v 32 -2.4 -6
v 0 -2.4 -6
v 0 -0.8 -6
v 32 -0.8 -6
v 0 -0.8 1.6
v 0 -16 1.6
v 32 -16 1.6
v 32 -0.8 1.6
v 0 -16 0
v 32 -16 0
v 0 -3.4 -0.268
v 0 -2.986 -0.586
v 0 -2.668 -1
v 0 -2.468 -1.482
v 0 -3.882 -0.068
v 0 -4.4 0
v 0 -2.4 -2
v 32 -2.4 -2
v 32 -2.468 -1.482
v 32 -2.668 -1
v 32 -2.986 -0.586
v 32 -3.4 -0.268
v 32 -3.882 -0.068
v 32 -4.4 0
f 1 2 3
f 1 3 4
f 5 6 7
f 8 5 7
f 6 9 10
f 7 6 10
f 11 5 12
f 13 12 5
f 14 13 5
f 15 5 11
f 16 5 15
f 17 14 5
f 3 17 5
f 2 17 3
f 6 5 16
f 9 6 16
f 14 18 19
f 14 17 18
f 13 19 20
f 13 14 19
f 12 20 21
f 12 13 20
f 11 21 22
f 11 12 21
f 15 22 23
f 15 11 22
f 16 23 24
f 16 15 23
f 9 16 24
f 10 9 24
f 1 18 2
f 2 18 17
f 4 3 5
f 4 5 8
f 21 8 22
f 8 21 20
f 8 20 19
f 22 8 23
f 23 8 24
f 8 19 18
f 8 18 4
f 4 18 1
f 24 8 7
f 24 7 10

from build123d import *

# Parameters (mm, degrees)
SKETCH4_W           = 32
SKETCH4_H           = 16
BOSS_EXTRUDE3_DEPTH = 1.6
SKETCH5_W           = 32
SKETCH5_H           = 2.4
BOSS_EXTRUDE4_DEPTH = 6
SKETCH6_W           = 32
SKETCH6_H           = 7.6
SKETCH6_W_2         = 30.4
SKETCH6_H_2         = 6
BOSS_EXTRUDE5_DEPTH = 4.8
SKETCH7_W           = 12
SKETCH7_H           = 0.8
CUT_EXTRUDE1_DEPTH  = 4.8
SKETCH8_W           = 26
SKETCH8_H           = 0.8
BOSS_EXTRUDE6_DEPTH = 12
SKETCH9_W           = 0.8
SKETCH9_H           = 12.8
BOSS_EXTRUDE7_DEPTH = 4.8
SKETCH10_W          = 74.676808058
SKETCH10_H          = 45.618872406
CUT_EXTRUDE2_DEPTH  = 5.6
FILLET1_R           = 2


with BuildPart() as part:
    # Sketch4 → Boss-Extrude3 (new body)
    with BuildSketch(Plane.XY):
        with Locations((16, -8)):
            Rectangle(SKETCH4_W, SKETCH4_H)
    extrude(amount=BOSS_EXTRUDE3_DEPTH)

    # Sketch5 → Boss-Extrude4 (add)
    with BuildSketch(Plane(origin=(0, 0, 0), x_dir=(-1, 0, 0), z_dir=(0, 0, -1))):
        with Locations((-16, -1.2)):
            Rectangle(SKETCH5_W, SKETCH5_H)
    extrude(amount=BOSS_EXTRUDE4_DEPTH)

    # Sketch6 → Boss-Extrude5 (add)
    with BuildSketch(Plane(origin=(0, 0, 0), x_dir=(1, 0, 0), z_dir=(0, 1, 0))):
        with Locations((16, 2.2)):
            Rectangle(SKETCH6_W, SKETCH6_H)
        with Locations((16, 2.2)):
            Rectangle(SKETCH6_W_2, SKETCH6_H_2, mode=Mode.SUBTRACT)
    extrude(amount=BOSS_EXTRUDE5_DEPTH)

    # Sketch7 → Cut-Extrude1 (cut)
    with BuildSketch(Plane(origin=(0, 4.8, 0), x_dir=(1, 0, 0), z_dir=(0, 1, 0))):
        with Locations((16, -1.2)):
            Rectangle(SKETCH7_W, SKETCH7_H)
    extrude(amount=-CUT_EXTRUDE1_DEPTH, mode=Mode.SUBTRACT)

    # Sketch8 → Boss-Extrude6 (add)
    with BuildSketch(Plane.XY.offset(1.6)):
        with Locations((23, -0.4)):
            Rectangle(SKETCH8_W, SKETCH8_H)
    extrude(amount=BOSS_EXTRUDE6_DEPTH)

    # Sketch9 → Boss-Extrude7 (add)
    with BuildSketch(Plane(origin=(0, 0, 0), x_dir=(1, 0, 0), z_dir=(0, 1, 0))):
        with Locations((10.4, -7.2)):
            Rectangle(SKETCH9_W, SKETCH9_H)
        with Locations((35.6, -7.2)):
            Rectangle(SKETCH9_W, SKETCH9_H)
    extrude(amount=BOSS_EXTRUDE7_DEPTH)

    # Sketch10 → Cut-Extrude2 (cut)
    with BuildSketch(Plane(origin=(0, 4.8, 0), x_dir=(1, 0, 0), z_dir=(0, 1, 0))):
        with Locations((31.433625096, -2.501503002)):
            Rectangle(SKETCH10_W, SKETCH10_H)
    extrude(amount=-CUT_EXTRUDE2_DEPTH, mode=Mode.SUBTRACT)

    # Fillet1
    fillet1_edges = [part.edges().sort_by_distance(p)[0] for p in [
        (16, -2.4, 0),
    ]]
    fillet(fillet1_edges, radius=FILLET1_R)


solid = part.part
